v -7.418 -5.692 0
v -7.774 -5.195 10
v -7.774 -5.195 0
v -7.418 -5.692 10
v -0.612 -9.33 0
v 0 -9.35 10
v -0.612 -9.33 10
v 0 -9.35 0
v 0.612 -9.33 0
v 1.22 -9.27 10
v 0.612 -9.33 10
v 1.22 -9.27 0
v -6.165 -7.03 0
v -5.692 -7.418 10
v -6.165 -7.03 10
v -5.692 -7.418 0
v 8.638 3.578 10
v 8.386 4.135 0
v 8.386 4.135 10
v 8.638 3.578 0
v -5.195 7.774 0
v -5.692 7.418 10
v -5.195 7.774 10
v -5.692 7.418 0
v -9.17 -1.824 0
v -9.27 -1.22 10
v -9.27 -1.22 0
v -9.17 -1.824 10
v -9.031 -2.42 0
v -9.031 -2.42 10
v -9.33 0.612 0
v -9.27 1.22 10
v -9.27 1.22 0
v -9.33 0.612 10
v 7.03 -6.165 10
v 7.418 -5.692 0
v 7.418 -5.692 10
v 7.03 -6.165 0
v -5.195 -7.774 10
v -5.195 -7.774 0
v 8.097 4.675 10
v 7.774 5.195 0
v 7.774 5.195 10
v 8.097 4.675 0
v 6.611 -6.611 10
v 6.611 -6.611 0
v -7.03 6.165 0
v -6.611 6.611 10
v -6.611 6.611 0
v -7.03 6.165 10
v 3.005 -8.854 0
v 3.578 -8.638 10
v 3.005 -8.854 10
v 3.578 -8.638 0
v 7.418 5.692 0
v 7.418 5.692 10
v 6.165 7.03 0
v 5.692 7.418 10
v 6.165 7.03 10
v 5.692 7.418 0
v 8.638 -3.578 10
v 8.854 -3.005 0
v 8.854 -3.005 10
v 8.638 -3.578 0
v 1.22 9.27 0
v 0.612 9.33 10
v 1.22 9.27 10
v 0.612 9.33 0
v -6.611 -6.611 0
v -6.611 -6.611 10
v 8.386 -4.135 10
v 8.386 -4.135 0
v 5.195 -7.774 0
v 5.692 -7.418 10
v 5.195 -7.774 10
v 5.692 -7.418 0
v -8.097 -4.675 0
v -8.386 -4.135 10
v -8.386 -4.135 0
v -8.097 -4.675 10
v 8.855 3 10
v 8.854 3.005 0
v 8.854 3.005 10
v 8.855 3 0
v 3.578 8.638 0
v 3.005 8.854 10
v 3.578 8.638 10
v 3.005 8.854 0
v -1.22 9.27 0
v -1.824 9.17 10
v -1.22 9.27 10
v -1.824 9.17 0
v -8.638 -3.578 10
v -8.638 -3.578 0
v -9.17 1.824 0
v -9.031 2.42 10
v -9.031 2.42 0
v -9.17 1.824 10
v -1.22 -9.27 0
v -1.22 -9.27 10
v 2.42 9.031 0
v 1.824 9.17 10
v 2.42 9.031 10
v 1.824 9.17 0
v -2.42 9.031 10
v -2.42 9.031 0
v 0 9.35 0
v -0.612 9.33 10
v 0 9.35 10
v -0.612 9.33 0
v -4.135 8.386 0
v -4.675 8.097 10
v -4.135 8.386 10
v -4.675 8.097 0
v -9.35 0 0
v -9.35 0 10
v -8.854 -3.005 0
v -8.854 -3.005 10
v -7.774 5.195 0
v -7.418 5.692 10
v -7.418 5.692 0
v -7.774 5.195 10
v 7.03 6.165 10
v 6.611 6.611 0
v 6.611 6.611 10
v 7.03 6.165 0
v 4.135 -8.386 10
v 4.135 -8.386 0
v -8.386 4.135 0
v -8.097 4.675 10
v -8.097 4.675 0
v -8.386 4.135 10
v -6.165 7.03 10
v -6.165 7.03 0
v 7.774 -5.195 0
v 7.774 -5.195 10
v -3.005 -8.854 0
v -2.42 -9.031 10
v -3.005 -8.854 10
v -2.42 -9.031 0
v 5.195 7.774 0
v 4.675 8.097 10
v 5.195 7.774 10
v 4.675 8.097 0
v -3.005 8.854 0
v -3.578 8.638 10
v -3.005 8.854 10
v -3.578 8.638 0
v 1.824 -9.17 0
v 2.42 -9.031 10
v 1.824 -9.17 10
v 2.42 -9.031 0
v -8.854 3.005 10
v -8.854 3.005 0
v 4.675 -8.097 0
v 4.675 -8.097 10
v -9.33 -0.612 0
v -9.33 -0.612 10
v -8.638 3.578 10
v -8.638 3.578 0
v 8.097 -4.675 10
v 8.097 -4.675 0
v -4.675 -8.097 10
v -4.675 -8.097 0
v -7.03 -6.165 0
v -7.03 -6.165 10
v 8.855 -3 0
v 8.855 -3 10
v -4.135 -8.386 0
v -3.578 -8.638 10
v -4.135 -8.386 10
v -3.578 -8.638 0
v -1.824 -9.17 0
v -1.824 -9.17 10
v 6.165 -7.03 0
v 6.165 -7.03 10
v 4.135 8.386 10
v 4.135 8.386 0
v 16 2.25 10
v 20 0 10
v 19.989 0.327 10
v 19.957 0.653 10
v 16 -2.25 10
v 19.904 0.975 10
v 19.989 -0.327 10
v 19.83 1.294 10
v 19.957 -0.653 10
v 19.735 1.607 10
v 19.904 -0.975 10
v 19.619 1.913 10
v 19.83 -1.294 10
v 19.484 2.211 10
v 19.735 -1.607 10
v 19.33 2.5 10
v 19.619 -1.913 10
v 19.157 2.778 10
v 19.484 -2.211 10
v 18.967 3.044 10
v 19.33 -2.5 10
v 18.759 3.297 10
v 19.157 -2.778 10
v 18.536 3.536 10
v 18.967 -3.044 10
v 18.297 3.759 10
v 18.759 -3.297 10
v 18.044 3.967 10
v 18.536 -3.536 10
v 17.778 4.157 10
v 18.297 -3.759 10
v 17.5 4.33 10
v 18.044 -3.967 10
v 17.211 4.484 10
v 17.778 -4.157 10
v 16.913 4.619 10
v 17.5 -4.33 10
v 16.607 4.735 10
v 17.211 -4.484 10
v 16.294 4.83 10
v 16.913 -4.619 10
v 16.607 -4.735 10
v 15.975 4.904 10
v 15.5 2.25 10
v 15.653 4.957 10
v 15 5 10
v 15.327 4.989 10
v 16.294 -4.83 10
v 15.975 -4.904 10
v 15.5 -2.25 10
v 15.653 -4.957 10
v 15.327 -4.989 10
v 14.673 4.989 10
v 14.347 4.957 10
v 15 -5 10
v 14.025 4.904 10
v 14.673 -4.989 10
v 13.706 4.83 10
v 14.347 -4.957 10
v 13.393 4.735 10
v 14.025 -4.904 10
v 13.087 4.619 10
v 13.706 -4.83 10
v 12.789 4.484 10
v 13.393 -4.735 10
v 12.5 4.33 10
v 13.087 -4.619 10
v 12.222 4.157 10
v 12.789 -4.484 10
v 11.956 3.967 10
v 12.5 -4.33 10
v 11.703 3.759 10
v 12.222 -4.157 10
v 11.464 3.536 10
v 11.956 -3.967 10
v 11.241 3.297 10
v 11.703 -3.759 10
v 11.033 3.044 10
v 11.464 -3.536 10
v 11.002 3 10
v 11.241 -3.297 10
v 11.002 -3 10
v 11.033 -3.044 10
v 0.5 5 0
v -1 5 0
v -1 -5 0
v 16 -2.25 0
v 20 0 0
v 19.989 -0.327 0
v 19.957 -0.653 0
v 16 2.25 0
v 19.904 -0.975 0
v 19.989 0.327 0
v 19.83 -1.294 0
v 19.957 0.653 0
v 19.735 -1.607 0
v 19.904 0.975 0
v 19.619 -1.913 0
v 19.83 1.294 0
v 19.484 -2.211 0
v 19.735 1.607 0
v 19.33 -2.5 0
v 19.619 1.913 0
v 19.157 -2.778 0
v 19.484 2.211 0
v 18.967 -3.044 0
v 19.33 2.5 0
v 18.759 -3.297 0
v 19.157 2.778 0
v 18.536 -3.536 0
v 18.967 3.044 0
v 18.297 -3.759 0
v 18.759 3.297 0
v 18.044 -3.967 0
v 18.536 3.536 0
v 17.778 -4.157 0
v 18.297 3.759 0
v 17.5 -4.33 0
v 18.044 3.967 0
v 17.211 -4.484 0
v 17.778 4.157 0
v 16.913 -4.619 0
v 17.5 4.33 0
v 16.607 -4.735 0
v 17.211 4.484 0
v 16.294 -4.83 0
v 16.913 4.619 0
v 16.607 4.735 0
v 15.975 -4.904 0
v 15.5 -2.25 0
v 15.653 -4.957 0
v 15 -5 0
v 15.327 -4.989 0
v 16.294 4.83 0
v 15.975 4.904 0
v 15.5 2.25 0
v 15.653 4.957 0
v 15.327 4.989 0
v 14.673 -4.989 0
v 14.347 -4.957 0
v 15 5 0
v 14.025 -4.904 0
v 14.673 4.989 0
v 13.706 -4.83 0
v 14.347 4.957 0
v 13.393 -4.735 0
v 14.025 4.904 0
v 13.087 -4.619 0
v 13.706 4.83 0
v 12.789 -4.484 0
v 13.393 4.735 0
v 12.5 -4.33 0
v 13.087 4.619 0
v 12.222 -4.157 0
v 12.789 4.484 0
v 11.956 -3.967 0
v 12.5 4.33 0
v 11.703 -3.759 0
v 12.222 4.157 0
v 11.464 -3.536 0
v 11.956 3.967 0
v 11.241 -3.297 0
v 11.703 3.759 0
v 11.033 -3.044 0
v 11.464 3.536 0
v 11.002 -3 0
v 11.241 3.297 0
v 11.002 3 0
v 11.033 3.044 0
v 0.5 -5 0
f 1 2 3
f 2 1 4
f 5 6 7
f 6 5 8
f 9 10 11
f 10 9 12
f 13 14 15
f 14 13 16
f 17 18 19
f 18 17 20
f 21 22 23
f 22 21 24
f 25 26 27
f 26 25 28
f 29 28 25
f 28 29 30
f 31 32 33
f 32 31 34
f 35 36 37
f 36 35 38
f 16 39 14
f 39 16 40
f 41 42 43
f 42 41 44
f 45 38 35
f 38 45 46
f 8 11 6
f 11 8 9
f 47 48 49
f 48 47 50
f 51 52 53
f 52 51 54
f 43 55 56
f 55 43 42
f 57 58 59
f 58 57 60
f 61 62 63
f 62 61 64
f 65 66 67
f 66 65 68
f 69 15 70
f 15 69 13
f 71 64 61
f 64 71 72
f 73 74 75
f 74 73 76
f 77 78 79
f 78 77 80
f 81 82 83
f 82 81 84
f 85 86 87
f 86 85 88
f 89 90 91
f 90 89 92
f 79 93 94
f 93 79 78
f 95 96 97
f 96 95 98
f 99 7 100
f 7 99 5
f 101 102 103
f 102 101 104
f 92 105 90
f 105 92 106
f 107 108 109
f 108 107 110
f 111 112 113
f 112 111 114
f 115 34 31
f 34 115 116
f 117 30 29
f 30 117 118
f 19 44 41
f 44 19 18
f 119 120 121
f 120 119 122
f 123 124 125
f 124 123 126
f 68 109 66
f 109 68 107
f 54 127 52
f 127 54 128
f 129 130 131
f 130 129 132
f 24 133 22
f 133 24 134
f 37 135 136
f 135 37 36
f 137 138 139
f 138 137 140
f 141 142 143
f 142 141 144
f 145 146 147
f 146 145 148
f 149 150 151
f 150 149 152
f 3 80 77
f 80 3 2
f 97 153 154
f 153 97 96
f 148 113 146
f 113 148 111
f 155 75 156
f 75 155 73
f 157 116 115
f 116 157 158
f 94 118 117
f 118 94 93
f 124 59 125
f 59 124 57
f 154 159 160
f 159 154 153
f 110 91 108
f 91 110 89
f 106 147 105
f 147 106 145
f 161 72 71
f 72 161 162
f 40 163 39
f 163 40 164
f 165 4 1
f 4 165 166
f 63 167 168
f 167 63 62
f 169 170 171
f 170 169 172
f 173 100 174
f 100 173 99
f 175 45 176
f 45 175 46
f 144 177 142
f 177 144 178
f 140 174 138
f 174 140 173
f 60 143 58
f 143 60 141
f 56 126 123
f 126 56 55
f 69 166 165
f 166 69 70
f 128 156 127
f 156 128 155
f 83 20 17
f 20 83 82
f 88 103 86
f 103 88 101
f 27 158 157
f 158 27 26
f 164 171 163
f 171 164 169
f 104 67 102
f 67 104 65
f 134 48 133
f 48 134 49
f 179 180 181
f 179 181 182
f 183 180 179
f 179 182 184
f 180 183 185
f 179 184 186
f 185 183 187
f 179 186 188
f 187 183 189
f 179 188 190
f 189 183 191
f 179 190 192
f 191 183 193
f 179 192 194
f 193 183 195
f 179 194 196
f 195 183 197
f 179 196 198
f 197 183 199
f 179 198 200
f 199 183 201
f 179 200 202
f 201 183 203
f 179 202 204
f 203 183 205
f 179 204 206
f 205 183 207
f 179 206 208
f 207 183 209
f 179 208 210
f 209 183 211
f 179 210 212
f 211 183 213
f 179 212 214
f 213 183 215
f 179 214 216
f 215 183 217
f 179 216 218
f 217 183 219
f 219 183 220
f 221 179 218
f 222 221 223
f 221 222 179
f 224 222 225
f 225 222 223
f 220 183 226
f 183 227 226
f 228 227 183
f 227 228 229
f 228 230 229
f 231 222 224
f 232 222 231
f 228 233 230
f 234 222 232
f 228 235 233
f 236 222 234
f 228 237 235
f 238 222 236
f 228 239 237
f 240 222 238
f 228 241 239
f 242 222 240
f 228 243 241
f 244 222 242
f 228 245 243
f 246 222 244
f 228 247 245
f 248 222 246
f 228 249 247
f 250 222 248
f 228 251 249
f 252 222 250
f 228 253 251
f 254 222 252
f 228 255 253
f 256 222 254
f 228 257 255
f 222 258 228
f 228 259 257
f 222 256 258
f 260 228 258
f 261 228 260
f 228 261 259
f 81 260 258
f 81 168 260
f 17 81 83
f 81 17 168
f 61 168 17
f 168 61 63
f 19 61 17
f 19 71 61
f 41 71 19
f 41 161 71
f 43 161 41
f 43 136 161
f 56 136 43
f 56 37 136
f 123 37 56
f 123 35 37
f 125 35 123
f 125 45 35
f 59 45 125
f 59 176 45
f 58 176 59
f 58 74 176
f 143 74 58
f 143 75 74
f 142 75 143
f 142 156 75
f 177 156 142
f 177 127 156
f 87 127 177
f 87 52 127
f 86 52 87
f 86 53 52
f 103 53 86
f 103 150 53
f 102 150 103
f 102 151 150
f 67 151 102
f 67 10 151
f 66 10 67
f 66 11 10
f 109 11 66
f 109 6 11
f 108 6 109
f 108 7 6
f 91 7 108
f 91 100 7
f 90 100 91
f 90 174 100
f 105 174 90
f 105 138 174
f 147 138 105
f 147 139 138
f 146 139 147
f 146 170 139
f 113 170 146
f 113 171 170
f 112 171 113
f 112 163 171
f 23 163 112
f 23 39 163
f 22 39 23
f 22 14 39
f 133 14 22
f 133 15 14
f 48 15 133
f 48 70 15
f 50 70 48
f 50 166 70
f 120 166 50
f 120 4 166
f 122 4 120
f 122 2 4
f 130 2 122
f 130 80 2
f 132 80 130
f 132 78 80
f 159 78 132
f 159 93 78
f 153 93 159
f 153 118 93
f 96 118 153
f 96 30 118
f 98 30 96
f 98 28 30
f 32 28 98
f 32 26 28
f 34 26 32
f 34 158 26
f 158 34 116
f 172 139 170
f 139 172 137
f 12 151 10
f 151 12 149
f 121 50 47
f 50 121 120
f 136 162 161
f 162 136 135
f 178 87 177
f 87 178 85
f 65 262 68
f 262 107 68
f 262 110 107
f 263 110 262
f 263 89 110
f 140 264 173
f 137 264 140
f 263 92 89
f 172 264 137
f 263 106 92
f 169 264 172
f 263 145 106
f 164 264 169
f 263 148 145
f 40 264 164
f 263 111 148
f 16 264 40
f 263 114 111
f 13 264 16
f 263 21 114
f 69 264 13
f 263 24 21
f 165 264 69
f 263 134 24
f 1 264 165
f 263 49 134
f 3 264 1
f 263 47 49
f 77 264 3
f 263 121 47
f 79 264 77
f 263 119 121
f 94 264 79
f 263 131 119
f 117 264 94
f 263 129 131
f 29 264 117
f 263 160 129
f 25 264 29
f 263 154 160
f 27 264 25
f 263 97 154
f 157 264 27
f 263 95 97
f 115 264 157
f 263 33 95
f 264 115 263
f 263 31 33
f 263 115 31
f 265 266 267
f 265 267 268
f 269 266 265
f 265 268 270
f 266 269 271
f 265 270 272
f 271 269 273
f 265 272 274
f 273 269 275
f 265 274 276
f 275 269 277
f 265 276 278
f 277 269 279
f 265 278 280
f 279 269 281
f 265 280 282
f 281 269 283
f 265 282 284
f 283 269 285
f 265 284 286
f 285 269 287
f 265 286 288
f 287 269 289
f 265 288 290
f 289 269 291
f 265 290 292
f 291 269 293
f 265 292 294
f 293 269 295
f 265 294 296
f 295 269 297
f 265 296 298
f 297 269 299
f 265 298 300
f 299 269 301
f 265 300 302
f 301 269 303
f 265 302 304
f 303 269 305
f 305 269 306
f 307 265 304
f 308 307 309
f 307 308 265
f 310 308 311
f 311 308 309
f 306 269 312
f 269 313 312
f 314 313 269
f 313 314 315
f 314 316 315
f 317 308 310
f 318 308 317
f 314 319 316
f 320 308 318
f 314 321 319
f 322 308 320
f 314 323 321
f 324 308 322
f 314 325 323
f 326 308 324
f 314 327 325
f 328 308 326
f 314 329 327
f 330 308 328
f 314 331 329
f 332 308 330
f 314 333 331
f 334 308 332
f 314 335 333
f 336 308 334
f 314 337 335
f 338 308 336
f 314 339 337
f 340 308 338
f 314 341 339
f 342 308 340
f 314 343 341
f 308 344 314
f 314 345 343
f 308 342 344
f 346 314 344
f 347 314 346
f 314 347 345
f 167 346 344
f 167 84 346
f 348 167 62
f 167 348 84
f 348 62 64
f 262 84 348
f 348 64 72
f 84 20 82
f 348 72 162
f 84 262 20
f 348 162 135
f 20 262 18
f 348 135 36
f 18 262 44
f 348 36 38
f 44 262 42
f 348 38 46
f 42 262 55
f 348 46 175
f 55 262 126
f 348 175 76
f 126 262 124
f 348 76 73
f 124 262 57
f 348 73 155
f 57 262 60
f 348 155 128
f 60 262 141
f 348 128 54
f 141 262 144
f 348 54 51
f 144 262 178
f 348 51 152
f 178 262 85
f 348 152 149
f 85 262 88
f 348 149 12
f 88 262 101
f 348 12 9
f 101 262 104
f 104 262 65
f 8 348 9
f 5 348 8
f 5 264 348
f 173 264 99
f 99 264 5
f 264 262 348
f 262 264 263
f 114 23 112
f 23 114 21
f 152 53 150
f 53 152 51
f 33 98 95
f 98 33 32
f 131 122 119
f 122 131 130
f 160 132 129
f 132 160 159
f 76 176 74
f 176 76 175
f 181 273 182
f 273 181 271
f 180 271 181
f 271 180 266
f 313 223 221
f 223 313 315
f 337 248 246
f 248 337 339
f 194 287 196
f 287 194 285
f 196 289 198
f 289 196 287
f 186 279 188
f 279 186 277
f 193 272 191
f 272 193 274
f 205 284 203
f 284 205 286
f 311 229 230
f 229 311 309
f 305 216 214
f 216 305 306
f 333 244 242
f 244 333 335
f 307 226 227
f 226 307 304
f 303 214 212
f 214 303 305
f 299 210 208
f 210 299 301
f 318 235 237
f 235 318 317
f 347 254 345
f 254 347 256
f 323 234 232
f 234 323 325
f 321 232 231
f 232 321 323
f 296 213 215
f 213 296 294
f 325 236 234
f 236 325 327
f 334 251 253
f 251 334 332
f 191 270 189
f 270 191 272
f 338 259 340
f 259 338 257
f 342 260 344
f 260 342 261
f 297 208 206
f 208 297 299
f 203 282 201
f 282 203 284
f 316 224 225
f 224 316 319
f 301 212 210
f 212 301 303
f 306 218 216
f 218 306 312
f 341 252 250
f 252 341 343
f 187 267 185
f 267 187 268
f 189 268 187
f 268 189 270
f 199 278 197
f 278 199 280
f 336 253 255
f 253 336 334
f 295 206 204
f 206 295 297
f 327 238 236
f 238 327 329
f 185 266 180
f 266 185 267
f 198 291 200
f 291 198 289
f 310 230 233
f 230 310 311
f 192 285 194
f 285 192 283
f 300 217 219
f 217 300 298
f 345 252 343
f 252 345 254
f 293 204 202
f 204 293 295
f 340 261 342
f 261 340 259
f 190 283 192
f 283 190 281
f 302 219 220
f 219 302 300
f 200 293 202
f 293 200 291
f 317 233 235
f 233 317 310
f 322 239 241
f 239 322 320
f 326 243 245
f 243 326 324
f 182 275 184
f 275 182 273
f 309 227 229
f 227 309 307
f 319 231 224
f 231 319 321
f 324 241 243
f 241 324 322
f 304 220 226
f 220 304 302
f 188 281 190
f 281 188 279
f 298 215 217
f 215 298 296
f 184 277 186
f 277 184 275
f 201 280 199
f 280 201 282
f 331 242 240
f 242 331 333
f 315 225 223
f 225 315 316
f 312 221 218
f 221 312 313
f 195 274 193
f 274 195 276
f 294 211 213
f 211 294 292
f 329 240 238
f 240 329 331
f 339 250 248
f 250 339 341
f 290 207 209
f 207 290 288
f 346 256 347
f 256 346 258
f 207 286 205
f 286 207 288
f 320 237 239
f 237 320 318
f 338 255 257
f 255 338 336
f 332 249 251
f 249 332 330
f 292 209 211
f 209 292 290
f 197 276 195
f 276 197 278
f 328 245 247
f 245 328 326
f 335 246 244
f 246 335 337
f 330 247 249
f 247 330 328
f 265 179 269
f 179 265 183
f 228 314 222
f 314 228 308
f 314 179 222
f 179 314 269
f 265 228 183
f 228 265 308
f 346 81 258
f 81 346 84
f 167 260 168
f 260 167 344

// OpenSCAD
// Snap-on tubing clip for 12.7 mm lab stand rod
// Print orientation: flat on bed, extrusion along +Z

$fn = 96;

// ---- Dimensions (mm) ----
rod_id      = 12.7;   // stand rod diameter
rod_wall    = 3;      // rod ring wall thickness
ring_h      = 10;     // extrusion height for rod ring

tub_id      = 6;      // tubing ring inner diameter
tub_wall    = 2;      // tubing ring wall thickness
tub_x       = 15;     // tubing ring centre X
tub_ring_h  = 10;     // extrusion height for tubing ring

bridge_w    = 6;      // solid bridge width (Y)
bridge_x0   = 8;      // solid bridge start (X)
bridge_x1   = 12;     // solid bridge end (X)

eps         = 0.5;    // cutter overshoot past faces

// ---- Derived ----
rod_od = rod_id + 2 * rod_wall;
tub_od = tub_id + 2 * tub_wall;

module rod_ring() {
    difference() {
        translate([0, 0, 0])
            cylinder(d = rod_od, h = ring_h);
        // opening on -X side: x < 0, -5 < y < 5
        translate([-1, -5, -eps])
            cube([1 + eps, 10, eps]);
    }
}

module tub_ring() {
    difference() {
        translate([tub_x, 0, 0])
            cylinder(d = tub_od, h = tub_ring_h);
        // opening on +X side: x > 15, -2.25 < y < 2.25
        translate([tub_x + eps, -2.25, 0])
            cube([eps, 4.5, tub_ring_h]);
    }
}

module solid_bridge() {
    // joins the two rings without blocking either hole
    translate([bridge_x0, -bridge_w / 2, 0])
        cube([bridge_x1 - bridge_x0, bridge_w, ring_h]);
}

union() {
    rod_ring();
    tub_ring();
    solid_bridge();
}
